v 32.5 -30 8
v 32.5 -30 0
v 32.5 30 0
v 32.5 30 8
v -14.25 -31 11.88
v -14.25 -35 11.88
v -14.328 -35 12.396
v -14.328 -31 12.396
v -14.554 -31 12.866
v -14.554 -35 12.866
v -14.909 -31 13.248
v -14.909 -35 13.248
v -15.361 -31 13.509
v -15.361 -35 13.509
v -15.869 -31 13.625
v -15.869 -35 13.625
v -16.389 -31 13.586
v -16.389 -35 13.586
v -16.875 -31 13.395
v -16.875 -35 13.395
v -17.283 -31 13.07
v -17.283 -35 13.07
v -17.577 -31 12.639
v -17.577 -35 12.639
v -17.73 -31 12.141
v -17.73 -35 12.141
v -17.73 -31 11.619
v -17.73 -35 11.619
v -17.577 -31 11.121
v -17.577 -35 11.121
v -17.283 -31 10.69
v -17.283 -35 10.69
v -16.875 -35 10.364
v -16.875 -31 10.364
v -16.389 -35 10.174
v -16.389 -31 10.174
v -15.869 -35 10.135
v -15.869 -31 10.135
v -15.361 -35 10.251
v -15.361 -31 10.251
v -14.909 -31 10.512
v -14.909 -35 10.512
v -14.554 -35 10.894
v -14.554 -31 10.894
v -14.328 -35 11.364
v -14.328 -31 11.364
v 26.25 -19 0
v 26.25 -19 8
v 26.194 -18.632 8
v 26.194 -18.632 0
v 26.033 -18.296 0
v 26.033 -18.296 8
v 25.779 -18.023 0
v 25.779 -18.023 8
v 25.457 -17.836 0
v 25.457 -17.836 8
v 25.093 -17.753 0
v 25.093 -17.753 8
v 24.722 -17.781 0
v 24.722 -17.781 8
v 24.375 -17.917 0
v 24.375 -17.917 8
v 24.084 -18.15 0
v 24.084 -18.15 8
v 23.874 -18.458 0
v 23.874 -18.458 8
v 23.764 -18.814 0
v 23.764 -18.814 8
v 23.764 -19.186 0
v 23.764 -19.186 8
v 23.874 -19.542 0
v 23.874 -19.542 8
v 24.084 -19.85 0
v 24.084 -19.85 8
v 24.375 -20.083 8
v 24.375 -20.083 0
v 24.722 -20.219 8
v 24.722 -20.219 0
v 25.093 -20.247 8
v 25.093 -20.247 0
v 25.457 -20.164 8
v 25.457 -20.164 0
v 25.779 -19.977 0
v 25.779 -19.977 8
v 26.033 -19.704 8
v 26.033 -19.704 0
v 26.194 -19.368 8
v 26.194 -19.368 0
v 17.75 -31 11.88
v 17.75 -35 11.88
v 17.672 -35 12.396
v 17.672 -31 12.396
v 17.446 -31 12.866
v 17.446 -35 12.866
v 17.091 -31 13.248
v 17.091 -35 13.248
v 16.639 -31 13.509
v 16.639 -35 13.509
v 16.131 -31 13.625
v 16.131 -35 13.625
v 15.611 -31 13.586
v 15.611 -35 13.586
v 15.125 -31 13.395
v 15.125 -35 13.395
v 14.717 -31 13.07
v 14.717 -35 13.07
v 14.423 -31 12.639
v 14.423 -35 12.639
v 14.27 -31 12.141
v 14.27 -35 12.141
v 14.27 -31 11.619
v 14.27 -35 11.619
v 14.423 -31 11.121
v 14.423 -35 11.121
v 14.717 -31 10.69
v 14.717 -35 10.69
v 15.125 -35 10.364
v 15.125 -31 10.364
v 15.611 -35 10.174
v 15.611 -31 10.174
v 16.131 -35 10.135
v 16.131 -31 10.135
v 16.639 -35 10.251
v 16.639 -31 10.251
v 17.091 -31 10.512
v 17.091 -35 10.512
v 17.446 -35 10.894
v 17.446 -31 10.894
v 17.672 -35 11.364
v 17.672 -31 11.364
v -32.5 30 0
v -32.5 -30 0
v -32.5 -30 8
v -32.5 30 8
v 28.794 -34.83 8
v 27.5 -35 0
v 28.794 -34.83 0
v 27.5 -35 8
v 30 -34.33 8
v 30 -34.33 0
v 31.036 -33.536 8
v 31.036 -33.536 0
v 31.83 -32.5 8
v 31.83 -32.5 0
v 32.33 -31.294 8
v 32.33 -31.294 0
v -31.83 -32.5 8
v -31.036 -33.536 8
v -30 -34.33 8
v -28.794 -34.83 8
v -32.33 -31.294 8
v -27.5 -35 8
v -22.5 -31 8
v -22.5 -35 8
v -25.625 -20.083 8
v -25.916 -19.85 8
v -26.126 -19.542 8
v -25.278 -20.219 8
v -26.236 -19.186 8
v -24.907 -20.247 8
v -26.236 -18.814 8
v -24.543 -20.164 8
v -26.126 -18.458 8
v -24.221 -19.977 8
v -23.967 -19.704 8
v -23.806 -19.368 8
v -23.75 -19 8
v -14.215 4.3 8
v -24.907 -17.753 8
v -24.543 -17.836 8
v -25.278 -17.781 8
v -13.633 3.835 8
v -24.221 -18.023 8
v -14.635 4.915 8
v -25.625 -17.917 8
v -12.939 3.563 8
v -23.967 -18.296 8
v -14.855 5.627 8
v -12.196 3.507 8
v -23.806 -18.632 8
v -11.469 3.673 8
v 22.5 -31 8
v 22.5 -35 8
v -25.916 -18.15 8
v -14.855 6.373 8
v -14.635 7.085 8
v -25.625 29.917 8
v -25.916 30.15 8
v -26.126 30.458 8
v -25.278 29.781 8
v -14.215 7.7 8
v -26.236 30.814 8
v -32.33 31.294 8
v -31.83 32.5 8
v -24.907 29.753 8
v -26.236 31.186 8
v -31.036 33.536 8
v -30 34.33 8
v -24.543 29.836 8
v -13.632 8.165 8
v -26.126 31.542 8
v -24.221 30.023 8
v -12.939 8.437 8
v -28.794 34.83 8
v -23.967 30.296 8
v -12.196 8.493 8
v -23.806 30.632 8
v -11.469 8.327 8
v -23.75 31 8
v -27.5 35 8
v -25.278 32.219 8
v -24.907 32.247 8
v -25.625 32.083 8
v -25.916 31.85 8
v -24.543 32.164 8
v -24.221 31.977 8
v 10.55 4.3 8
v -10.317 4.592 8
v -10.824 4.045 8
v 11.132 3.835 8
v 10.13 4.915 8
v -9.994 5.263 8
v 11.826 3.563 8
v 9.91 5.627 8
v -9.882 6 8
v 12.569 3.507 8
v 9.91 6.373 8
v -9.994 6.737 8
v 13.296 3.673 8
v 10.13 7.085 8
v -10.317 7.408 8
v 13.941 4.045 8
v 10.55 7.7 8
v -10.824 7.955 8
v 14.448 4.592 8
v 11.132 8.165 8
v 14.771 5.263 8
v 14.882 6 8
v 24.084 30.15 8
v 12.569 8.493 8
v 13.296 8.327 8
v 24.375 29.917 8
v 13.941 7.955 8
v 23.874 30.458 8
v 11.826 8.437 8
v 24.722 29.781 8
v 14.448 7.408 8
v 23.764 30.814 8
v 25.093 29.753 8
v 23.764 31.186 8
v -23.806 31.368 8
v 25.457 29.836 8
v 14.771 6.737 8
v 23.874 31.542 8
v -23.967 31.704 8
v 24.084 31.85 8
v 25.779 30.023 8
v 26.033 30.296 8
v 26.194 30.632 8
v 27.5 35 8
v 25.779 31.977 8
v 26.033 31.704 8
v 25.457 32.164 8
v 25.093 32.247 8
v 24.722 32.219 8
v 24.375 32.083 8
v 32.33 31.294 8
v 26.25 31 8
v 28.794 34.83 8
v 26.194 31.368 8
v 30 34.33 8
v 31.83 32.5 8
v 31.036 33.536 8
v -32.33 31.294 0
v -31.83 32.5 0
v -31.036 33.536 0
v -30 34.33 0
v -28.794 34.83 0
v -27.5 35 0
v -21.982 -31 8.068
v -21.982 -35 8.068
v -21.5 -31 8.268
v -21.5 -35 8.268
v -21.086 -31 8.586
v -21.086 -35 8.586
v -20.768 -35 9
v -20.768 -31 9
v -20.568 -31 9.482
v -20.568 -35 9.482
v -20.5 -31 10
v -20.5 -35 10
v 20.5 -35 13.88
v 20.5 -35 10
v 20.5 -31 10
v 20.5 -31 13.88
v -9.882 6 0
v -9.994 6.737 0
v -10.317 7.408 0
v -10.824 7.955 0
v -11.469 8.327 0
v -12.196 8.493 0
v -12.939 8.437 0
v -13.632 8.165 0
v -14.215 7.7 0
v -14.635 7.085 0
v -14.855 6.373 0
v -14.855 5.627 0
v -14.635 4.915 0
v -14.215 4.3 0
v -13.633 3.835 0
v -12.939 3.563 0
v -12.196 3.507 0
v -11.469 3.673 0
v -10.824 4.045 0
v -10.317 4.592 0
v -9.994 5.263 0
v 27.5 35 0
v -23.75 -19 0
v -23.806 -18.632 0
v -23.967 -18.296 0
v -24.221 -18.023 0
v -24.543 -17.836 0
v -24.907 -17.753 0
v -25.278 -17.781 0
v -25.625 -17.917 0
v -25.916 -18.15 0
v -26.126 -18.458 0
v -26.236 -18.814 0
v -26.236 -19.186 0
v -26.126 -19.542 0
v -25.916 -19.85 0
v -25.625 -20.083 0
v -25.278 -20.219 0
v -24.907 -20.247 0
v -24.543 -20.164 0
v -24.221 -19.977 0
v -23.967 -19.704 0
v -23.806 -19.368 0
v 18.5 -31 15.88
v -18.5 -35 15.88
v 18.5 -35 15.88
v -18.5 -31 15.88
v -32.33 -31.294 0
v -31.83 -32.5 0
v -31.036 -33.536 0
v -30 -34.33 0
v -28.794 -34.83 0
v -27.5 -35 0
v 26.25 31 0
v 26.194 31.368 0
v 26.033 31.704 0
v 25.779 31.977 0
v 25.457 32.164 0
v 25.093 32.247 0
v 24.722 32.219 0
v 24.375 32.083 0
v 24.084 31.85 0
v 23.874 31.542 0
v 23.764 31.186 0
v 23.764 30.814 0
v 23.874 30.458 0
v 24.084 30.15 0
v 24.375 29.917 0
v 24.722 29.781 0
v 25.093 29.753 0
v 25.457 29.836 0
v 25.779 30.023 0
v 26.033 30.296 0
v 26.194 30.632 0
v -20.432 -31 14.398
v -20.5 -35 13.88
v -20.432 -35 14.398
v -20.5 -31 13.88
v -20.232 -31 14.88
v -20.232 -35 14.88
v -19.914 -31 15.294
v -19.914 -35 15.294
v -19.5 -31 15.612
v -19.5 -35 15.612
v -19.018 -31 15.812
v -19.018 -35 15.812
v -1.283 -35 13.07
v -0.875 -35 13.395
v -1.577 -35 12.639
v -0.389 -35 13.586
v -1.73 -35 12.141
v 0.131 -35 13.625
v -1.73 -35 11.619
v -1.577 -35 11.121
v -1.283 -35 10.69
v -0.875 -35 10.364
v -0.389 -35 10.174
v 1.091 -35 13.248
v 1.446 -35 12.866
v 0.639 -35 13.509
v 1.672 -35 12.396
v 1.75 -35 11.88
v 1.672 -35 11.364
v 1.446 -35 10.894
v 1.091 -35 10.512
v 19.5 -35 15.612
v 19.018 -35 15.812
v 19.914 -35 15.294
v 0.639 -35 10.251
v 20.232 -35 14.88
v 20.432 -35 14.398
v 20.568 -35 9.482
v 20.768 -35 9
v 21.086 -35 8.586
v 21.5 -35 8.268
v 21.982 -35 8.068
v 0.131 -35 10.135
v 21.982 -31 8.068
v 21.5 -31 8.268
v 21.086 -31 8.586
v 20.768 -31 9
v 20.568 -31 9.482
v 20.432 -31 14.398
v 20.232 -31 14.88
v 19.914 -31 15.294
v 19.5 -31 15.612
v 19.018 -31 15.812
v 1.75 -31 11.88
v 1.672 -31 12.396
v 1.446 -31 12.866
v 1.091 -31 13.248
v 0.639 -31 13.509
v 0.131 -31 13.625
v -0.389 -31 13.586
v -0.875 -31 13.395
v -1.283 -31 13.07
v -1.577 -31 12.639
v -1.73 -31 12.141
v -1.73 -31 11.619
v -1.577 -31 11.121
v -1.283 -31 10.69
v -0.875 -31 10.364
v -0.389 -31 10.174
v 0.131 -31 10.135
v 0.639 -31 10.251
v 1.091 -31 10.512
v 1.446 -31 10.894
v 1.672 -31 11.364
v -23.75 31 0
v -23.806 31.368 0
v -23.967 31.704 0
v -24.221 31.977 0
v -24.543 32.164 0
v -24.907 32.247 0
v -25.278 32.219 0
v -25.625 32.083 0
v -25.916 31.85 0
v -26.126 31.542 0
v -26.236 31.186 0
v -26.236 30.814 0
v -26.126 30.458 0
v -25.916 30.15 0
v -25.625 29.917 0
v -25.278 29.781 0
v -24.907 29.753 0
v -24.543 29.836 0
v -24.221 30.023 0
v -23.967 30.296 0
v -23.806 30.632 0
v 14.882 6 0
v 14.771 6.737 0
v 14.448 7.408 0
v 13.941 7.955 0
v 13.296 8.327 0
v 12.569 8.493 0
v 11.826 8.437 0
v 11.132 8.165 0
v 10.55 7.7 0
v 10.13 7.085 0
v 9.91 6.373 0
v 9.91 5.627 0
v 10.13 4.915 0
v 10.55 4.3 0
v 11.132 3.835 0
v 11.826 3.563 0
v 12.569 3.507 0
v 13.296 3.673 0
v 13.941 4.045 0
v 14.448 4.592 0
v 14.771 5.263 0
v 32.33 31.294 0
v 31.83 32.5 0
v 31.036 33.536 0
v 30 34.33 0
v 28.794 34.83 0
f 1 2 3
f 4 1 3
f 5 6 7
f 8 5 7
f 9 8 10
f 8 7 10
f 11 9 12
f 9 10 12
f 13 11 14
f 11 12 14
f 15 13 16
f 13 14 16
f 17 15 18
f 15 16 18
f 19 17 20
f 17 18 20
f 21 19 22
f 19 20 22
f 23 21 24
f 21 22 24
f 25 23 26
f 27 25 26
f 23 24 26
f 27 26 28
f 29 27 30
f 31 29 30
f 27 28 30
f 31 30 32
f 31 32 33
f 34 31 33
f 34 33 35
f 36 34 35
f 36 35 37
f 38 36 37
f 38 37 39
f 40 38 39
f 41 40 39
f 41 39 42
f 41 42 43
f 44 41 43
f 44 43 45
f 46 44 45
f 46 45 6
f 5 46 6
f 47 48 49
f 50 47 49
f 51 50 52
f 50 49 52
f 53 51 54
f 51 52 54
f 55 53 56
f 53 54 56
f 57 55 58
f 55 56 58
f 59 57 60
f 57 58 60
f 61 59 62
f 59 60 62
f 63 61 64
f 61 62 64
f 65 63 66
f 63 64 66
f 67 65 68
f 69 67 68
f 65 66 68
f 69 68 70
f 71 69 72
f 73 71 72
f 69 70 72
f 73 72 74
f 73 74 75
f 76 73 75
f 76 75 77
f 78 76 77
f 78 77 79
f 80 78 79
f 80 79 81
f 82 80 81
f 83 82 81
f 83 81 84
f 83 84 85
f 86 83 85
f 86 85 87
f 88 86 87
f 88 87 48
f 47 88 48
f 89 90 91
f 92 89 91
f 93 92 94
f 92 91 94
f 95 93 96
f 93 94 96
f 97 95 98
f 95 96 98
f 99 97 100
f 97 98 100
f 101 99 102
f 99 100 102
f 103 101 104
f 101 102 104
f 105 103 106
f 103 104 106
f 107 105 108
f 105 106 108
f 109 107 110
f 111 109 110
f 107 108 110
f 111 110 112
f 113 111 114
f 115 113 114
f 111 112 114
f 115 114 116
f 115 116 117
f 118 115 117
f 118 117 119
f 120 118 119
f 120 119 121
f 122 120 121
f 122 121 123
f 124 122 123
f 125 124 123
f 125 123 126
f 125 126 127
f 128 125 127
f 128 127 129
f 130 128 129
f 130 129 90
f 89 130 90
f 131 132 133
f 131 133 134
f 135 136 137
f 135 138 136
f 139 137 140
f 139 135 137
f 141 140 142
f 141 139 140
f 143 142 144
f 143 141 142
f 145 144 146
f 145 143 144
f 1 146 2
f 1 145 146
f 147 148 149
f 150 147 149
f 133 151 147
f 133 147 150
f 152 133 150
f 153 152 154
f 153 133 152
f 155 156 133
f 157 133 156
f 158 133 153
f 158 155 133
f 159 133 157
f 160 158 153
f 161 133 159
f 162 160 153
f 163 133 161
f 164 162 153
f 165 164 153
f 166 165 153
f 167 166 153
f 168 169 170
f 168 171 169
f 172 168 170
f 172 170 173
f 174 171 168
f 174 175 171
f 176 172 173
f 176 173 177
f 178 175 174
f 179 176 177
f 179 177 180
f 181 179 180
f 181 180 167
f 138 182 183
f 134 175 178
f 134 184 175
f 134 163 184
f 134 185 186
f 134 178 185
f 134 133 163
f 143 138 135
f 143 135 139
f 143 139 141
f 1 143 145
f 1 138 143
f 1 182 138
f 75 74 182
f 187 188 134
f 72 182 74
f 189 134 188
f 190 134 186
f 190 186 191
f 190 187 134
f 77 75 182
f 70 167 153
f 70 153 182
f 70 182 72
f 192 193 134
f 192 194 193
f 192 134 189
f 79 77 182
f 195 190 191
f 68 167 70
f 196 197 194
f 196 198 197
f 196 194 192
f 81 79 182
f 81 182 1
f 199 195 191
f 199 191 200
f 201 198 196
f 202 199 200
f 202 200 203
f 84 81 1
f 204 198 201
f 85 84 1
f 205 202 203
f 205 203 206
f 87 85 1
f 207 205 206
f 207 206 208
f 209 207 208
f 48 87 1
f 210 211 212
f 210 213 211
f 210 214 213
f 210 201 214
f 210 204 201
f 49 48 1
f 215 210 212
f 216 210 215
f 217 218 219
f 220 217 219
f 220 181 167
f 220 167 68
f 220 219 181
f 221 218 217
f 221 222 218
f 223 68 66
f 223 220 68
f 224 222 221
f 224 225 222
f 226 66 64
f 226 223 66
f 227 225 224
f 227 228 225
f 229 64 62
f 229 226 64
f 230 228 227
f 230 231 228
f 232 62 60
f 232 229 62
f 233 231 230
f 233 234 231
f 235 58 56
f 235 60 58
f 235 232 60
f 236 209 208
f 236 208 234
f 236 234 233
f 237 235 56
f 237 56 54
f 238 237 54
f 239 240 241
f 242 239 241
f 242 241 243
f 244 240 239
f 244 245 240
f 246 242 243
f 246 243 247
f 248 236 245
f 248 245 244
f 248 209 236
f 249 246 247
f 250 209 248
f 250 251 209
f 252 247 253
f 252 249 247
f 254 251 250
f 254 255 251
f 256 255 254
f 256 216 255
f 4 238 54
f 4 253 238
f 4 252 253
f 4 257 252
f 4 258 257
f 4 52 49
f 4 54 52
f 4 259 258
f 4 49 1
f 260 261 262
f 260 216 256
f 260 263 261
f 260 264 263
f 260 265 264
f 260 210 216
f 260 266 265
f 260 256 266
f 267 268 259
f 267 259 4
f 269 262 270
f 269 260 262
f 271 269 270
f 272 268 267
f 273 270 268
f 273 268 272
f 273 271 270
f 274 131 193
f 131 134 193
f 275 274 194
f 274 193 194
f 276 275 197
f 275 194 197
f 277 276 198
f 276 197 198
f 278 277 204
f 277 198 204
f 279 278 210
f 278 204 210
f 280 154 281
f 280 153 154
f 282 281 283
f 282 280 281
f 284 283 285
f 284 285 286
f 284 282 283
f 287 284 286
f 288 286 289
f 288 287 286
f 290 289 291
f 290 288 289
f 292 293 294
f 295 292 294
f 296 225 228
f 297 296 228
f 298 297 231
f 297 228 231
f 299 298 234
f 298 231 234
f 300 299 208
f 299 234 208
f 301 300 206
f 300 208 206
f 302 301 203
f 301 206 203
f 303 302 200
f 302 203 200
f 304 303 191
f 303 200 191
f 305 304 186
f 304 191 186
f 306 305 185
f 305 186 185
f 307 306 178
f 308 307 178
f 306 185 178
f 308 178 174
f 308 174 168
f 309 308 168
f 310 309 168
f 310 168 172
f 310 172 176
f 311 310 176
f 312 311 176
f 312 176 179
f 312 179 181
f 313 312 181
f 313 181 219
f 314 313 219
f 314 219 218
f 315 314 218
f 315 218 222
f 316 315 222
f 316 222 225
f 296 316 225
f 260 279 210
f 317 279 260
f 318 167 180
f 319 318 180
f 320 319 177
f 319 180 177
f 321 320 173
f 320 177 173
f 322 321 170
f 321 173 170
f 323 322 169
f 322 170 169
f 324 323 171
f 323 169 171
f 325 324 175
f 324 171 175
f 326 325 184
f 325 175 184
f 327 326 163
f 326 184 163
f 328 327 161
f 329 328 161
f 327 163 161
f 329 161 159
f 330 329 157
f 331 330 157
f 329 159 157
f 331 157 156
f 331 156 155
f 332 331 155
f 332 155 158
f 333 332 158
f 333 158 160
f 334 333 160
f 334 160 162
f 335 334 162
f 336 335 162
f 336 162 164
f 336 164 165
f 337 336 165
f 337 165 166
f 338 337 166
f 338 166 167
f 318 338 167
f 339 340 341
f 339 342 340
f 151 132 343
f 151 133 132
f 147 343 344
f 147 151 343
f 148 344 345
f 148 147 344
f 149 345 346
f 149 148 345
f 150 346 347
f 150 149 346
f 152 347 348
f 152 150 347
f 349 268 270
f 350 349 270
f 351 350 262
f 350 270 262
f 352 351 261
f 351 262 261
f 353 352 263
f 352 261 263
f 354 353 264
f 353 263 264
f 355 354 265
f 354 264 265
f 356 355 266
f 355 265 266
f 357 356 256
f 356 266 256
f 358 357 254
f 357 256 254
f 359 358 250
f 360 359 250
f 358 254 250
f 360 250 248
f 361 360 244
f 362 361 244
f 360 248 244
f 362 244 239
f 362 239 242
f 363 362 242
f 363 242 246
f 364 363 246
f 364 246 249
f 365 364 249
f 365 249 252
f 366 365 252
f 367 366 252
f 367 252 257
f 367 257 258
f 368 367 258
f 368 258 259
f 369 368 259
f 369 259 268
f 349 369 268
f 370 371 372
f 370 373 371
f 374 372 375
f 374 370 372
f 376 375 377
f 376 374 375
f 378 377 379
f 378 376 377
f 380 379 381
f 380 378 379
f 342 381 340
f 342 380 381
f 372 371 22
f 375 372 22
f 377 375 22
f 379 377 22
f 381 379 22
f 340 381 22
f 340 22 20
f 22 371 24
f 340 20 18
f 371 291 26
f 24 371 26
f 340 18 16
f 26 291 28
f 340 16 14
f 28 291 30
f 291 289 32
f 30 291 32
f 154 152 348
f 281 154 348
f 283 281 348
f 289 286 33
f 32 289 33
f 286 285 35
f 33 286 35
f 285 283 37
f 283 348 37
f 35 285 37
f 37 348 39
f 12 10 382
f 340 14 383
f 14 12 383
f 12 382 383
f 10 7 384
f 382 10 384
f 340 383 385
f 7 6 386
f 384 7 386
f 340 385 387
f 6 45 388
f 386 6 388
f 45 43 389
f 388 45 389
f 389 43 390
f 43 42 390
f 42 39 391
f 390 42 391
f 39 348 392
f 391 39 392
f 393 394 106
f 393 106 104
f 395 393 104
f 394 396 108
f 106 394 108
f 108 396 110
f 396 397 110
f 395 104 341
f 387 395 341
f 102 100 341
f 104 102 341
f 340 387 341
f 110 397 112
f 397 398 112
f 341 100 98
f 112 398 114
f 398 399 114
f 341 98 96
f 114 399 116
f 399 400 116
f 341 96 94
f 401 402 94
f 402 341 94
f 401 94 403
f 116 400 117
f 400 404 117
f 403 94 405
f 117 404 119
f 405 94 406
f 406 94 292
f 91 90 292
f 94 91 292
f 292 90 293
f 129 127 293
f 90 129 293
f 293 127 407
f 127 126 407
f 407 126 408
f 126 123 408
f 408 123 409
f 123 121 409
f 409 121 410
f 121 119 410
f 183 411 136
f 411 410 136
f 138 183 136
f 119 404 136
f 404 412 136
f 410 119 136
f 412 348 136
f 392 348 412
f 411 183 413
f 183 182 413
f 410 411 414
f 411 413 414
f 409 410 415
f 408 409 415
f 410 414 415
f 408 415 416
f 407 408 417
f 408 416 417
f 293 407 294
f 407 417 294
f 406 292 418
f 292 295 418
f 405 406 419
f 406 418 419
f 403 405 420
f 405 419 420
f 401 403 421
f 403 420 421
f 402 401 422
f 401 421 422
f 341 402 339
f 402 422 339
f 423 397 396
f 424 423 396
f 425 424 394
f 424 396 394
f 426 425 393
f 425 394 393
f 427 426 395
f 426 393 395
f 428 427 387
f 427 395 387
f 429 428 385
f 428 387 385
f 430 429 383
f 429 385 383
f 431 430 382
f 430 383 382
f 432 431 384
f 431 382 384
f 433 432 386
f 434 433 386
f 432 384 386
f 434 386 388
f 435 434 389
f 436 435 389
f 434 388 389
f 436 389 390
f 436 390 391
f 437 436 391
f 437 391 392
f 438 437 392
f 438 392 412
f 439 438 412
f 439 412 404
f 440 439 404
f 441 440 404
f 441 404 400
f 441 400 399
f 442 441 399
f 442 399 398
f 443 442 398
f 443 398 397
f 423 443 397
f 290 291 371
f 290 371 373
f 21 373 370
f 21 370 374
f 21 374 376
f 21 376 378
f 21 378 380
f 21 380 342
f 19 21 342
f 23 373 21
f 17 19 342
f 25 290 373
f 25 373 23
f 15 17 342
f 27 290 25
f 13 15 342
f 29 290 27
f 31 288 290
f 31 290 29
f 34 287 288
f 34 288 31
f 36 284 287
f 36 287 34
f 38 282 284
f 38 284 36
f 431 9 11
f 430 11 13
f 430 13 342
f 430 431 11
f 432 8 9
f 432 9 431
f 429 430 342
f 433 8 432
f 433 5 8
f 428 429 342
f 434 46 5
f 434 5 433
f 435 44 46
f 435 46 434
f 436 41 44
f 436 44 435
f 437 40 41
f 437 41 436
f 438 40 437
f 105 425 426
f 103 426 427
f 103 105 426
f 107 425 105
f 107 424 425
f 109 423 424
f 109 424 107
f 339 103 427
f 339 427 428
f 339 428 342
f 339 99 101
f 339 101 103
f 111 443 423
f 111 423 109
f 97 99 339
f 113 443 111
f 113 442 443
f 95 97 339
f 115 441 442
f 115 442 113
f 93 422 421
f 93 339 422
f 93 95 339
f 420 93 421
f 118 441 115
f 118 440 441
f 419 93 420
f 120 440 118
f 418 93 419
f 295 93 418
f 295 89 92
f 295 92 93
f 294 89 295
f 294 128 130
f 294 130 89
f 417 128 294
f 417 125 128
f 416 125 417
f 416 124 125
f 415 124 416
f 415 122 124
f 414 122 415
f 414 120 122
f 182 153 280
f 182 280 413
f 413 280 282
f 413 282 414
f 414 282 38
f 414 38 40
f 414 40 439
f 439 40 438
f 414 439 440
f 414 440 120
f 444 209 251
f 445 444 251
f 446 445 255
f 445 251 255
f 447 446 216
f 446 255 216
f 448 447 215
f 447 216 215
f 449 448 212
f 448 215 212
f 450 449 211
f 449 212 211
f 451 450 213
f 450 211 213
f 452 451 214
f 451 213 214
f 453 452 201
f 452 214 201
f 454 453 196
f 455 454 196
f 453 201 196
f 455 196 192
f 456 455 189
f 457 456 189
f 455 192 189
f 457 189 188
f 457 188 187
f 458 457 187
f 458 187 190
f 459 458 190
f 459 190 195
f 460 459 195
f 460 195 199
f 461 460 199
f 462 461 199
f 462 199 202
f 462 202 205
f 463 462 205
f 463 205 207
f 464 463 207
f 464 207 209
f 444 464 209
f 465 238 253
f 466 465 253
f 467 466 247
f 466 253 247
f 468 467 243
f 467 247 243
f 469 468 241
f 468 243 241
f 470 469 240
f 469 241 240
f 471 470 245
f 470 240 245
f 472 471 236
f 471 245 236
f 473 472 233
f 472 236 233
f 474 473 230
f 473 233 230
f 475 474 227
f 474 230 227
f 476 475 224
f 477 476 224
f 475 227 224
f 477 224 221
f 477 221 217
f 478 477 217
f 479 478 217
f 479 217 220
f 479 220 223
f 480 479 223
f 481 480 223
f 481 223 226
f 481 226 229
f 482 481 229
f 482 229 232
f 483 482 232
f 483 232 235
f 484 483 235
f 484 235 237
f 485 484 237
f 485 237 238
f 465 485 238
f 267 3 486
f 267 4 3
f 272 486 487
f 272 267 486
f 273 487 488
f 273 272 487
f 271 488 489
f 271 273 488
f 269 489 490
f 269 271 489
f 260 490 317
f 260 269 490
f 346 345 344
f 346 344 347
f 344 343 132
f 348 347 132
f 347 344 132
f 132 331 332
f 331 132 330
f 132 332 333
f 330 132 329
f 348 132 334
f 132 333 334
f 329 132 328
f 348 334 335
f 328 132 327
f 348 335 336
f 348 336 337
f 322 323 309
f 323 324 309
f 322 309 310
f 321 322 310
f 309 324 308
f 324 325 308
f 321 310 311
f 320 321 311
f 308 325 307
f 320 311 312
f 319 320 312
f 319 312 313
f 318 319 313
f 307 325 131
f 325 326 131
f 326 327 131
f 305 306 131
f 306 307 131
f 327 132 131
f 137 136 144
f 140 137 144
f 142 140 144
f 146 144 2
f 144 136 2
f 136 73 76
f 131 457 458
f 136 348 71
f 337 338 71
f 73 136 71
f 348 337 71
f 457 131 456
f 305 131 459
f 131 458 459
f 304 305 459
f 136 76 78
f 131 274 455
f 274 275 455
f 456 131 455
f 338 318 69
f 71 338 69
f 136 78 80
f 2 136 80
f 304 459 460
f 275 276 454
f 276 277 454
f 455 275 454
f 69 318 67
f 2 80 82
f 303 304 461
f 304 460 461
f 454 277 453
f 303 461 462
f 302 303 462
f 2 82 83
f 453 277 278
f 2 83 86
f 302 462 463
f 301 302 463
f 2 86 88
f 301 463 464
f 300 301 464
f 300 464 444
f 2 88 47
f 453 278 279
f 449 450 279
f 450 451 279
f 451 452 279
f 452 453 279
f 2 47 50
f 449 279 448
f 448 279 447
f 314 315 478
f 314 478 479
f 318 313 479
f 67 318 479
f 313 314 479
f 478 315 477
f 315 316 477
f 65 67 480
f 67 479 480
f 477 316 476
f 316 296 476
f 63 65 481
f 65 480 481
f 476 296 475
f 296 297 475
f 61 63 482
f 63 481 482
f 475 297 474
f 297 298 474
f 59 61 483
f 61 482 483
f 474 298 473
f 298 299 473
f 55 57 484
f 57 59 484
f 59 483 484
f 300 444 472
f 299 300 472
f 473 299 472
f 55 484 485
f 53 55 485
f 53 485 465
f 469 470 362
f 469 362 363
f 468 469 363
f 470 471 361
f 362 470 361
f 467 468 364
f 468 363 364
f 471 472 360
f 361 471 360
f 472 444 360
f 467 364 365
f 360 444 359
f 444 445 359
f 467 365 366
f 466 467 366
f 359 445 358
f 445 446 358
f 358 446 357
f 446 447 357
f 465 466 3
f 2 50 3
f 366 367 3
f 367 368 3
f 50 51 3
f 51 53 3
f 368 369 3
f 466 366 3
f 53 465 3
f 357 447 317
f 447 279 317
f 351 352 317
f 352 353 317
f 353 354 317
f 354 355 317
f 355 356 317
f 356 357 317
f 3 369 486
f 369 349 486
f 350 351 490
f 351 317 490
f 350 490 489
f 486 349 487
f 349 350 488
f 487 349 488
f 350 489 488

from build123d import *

# Parameters (mm, degrees)
SKETCH1_W                   = 65
SKETCH1_H                   = 70
BOSS_EXTRUDE1_DEPTH         = 8
FILLET1_R                   = 5
SKETCH2_W                   = 41
SKETCH2_H                   = 4
BOSS_EXTRUDE2_DEPTH         = 7.87989528
FILLET2_R                   = 2
SKETCH_1_R                  = 1.75
CUT_EXTRUDE_1_DEPTH         = 71
HOLE_WIZARD_M3_1_D          = 2.5
HOLE_WIZARD_M3_1_DEPTH      = 10
HOLE_WIZARD_M3_1_TIP        = 0.751075774
SKETCH_11_W                 = 65
SKETCH_11_H                 = 70.4
EXTRUDE_1_DEPTH             = 2.9
FILLET_2_R                  = 5
FILLET_3_R                  = 5
FILLET_4_R                  = 5
FILLET_5_R                  = 5
SKETCH_24_W                 = 1.25
SKETCH_24_H                 = 2.901
HOLE_WIZARD_M3_2_AT_2_COUNT = 2
HOLE_WIZARD_M3_2_AT_2_PITCH = 50
HOLE_WIZARD_M3_2_AT_3_COUNT = 2
HOLE_WIZARD_M3_2_AT_3_PITCH = 50
HOLE_WIZARD_M3_2_AT_4_COUNT = 2
HOLE_WIZARD_M3_2_AT_4_PITCH = 70.710678119
HOLE_WIZARD_M4_2_AT_2_COUNT = 2
HOLE_WIZARD_M4_2_AT_2_PITCH = 17.145
HOLE_WIZARD_M4_2_AT_3_COUNT = 2
HOLE_WIZARD_M4_2_AT_3_PITCH = 34.29
HOLE_WIZARD_M4_2_AT_4_COUNT = 2
HOLE_WIZARD_M4_2_AT_4_PITCH = 29.696011096
SKETCH_28_W                 = 16.34592277
SKETCH_28_H                 = 84.825432557
CUT_EXTRUDE_4_DEPTH         = 66
HOLE_WIZARD_M6_1_D          = 5


with BuildPart() as part:
    # Sketch1 → Boss-Extrude1 (new body)
    with BuildSketch(Plane.XY):
        Rectangle(SKETCH1_W, SKETCH1_H)
    extrude(amount=BOSS_EXTRUDE1_DEPTH)

    # Fillet1
    fillet1_edges = [part.edges().sort_by_distance(p)[0] for p in [
        (32.5, -35, 4),
        (-32.5, -35, 4),
        (-32.5, 35, 4),
        (32.5, 35, 4),
    ]]
    fillet(fillet1_edges, radius=FILLET1_R)

    # Sketch2 → Boss-Extrude2 (add)
    with BuildSketch(Plane.XY.offset(8)):
        with Locations((0, -33)):
            Rectangle(SKETCH2_W, SKETCH2_H)
    extrude(amount=BOSS_EXTRUDE2_DEPTH)

    # Fillet2
    fillet2_edges = [part.edges().sort_by_distance(p)[0] for p in [
        (-20.5, -33, 8),
        (20.5, -33, 8),
        (-20.5, -33, 15.87989528),
        (20.5, -33, 15.87989528),
    ]]
    fillet(fillet2_edges, radius=FILLET2_R)

    # 草图1 → 切除-拉伸1 (cut, through all)
    with BuildSketch(Plane.XZ.offset(35)):
        with Locations((-16, 11.87989528)):
            Circle(SKETCH_1_R)
        with Locations((0, 11.87989528)):
            Circle(SKETCH_1_R)
        with Locations((16, 11.87989528)):
            Circle(SKETCH_1_R)
    extrude(amount=-CUT_EXTRUDE_1_DEPTH, mode=Mode.SUBTRACT)

    # M3 螺纹孔1
    with Locations(Plane(origin=(25, -19, 0), x_dir=(-1, 0, 0), z_dir=(0, 0, -1))):
        with Locations((0, 0), (0, 50), (50, 50), (50, 0)):
            Hole(HOLE_WIZARD_M3_1_D / 2, depth=HOLE_WIZARD_M3_1_DEPTH)
            with Locations((0, 0, -(HOLE_WIZARD_M3_1_DEPTH + HOLE_WIZARD_M3_1_TIP / 2))):  # 118° drill point
                Cone(0, HOLE_WIZARD_M3_1_D / 2, HOLE_WIZARD_M3_1_TIP, mode=Mode.SUBTRACT)

    # M6 螺纹孔1 (through all)
    with Locations(Plane(origin=(12.3825, 6, 0), x_dir=(-1, 0, 0), z_dir=(0, 0, -1))):
        with Locations((0, 0), (24.765, 0)):
            Hole(HOLE_WIZARD_M6_1_D / 2)


with BuildPart() as body_2:
    # 草图11 → 凸台-拉伸1 (new body)
    with BuildSketch(Plane(origin=(0, 0, -30.31), x_dir=(-1, 0, 0), z_dir=(0, 0, -1))):
        with Locations((0, 0.2)):
            Rectangle(SKETCH_11_W, SKETCH_11_H)
    extrude(amount=-EXTRUDE_1_DEPTH)

    # 圆角2
    fillet_2_edges = [body_2.edges().sort_by_distance(p)[0] for p in [
        (-32.5, 35.4, -28.86),
    ]]
    fillet(fillet_2_edges, radius=FILLET_2_R)

    # 圆角3
    fillet_3_edges = [body_2.edges().sort_by_distance(p)[0] for p in [
        (-32.5, -35, -28.86),
    ]]
    fillet(fillet_3_edges, radius=FILLET_3_R)

    # 圆角4
    fillet_4_edges = [body_2.edges().sort_by_distance(p)[0] for p in [
        (32.5, -35, -28.86),
    ]]
    fillet(fillet_4_edges, radius=FILLET_4_R)

    # 圆角5
    fillet_5_edges = [body_2.edges().sort_by_distance(p)[0] for p in [
        (32.5, 35.4, -28.86),
    ]]
    fillet(fillet_5_edges, radius=FILLET_5_R)

    # 草图24 → M3 螺纹孔2 (revolve, cut)
    with BuildSketch(Plane(origin=(25, 31, -30.31), x_dir=(0, 1, 0), z_dir=(1, 0, 0))):
        with Locations((0.625, 1.4505)):
            Rectangle(SKETCH_24_W, SKETCH_24_H)
    hole_wizard_m3_2 = revolve(axis=Axis((25, 31, -36.66), (0, 0, 1)), mode=Mode.SUBTRACT)

    # M3 螺纹孔2 at 2: M3 螺纹孔2 ×2
    with Locations(*[(-i * HOLE_WIZARD_M3_2_AT_2_PITCH, 0, 0) for i in range(1, HOLE_WIZARD_M3_2_AT_2_COUNT)]):
        add(hole_wizard_m3_2, mode=Mode.SUBTRACT)

    # M3 螺纹孔2 at 3: M3 螺纹孔2 ×2
    with Locations(*[(0, -i * HOLE_WIZARD_M3_2_AT_3_PITCH, 0) for i in range(1, HOLE_WIZARD_M3_2_AT_3_COUNT)]):
        add(hole_wizard_m3_2, mode=Mode.SUBTRACT)

    # M3 螺纹孔2 at 4: M3 螺纹孔2 ×2
    with Locations(*[Vector(-0.707106781, -0.707106781, 0) * (i * HOLE_WIZARD_M3_2_AT_4_PITCH) for i in range(1, HOLE_WIZARD_M3_2_AT_4_COUNT)]):
        add(hole_wizard_m3_2, mode=Mode.SUBTRACT)

    # 草图27 → M4 六角凹头螺钉的柱形沉头孔2 (revolve, cut)
    with BuildSketch(Plane(origin=(9.41775, -9.820005548, -30.31), x_dir=(0, 1, 0), z_dir=(1, 0, 0))):
        Polygon((0, 0), (0, 38.31), (2.25, 38.31), (2.25, 1.5), (4, 1.5), (4, 0), align=None)
    hole_wizard_m4_2 = revolve(axis=Axis((9.41775, -9.820005548, -36.66), (0, 0, 1)), mode=Mode.SUBTRACT)

    # M4 六角凹头螺钉的柱形沉头孔2 at 2: M4 六角凹头螺钉的柱形沉头孔2 ×2
    with Locations(*[(-i * HOLE_WIZARD_M4_2_AT_2_PITCH, 0, 0) for i in range(1, HOLE_WIZARD_M4_2_AT_2_COUNT)]):
        add(hole_wizard_m4_2, mode=Mode.SUBTRACT)

    # M4 六角凹头螺钉的柱形沉头孔2 at 3: M4 六角凹头螺钉的柱形沉头孔2 ×2
    with Locations(*[Vector(-0.5, 0.866025404, 0) * (i * HOLE_WIZARD_M4_2_AT_3_PITCH) for i in range(1, HOLE_WIZARD_M4_2_AT_3_COUNT)]):
        add(hole_wizard_m4_2, mode=Mode.SUBTRACT)

    # M4 六角凹头螺钉的柱形沉头孔2 at 4: M4 六角凹头螺钉的柱形沉头孔2 ×2
    with Locations(*[(0, i * HOLE_WIZARD_M4_2_AT_4_PITCH, 0) for i in range(1, HOLE_WIZARD_M4_2_AT_4_COUNT)]):
        add(hole_wizard_m4_2, mode=Mode.SUBTRACT)

    # 草图28 → 切除-拉伸4 (cut, through all)
    with BuildSketch(Plane(origin=(32.5, 0, 0), x_dir=(0, 0, -1), z_dir=(1, 0, 0))):
        with Locations((29.455626585, -1.857491224)):
            Rectangle(SKETCH_28_W, SKETCH_28_H)
    extrude(amount=-CUT_EXTRUDE_4_DEPTH, mode=Mode.SUBTRACT)


solid = part.part
